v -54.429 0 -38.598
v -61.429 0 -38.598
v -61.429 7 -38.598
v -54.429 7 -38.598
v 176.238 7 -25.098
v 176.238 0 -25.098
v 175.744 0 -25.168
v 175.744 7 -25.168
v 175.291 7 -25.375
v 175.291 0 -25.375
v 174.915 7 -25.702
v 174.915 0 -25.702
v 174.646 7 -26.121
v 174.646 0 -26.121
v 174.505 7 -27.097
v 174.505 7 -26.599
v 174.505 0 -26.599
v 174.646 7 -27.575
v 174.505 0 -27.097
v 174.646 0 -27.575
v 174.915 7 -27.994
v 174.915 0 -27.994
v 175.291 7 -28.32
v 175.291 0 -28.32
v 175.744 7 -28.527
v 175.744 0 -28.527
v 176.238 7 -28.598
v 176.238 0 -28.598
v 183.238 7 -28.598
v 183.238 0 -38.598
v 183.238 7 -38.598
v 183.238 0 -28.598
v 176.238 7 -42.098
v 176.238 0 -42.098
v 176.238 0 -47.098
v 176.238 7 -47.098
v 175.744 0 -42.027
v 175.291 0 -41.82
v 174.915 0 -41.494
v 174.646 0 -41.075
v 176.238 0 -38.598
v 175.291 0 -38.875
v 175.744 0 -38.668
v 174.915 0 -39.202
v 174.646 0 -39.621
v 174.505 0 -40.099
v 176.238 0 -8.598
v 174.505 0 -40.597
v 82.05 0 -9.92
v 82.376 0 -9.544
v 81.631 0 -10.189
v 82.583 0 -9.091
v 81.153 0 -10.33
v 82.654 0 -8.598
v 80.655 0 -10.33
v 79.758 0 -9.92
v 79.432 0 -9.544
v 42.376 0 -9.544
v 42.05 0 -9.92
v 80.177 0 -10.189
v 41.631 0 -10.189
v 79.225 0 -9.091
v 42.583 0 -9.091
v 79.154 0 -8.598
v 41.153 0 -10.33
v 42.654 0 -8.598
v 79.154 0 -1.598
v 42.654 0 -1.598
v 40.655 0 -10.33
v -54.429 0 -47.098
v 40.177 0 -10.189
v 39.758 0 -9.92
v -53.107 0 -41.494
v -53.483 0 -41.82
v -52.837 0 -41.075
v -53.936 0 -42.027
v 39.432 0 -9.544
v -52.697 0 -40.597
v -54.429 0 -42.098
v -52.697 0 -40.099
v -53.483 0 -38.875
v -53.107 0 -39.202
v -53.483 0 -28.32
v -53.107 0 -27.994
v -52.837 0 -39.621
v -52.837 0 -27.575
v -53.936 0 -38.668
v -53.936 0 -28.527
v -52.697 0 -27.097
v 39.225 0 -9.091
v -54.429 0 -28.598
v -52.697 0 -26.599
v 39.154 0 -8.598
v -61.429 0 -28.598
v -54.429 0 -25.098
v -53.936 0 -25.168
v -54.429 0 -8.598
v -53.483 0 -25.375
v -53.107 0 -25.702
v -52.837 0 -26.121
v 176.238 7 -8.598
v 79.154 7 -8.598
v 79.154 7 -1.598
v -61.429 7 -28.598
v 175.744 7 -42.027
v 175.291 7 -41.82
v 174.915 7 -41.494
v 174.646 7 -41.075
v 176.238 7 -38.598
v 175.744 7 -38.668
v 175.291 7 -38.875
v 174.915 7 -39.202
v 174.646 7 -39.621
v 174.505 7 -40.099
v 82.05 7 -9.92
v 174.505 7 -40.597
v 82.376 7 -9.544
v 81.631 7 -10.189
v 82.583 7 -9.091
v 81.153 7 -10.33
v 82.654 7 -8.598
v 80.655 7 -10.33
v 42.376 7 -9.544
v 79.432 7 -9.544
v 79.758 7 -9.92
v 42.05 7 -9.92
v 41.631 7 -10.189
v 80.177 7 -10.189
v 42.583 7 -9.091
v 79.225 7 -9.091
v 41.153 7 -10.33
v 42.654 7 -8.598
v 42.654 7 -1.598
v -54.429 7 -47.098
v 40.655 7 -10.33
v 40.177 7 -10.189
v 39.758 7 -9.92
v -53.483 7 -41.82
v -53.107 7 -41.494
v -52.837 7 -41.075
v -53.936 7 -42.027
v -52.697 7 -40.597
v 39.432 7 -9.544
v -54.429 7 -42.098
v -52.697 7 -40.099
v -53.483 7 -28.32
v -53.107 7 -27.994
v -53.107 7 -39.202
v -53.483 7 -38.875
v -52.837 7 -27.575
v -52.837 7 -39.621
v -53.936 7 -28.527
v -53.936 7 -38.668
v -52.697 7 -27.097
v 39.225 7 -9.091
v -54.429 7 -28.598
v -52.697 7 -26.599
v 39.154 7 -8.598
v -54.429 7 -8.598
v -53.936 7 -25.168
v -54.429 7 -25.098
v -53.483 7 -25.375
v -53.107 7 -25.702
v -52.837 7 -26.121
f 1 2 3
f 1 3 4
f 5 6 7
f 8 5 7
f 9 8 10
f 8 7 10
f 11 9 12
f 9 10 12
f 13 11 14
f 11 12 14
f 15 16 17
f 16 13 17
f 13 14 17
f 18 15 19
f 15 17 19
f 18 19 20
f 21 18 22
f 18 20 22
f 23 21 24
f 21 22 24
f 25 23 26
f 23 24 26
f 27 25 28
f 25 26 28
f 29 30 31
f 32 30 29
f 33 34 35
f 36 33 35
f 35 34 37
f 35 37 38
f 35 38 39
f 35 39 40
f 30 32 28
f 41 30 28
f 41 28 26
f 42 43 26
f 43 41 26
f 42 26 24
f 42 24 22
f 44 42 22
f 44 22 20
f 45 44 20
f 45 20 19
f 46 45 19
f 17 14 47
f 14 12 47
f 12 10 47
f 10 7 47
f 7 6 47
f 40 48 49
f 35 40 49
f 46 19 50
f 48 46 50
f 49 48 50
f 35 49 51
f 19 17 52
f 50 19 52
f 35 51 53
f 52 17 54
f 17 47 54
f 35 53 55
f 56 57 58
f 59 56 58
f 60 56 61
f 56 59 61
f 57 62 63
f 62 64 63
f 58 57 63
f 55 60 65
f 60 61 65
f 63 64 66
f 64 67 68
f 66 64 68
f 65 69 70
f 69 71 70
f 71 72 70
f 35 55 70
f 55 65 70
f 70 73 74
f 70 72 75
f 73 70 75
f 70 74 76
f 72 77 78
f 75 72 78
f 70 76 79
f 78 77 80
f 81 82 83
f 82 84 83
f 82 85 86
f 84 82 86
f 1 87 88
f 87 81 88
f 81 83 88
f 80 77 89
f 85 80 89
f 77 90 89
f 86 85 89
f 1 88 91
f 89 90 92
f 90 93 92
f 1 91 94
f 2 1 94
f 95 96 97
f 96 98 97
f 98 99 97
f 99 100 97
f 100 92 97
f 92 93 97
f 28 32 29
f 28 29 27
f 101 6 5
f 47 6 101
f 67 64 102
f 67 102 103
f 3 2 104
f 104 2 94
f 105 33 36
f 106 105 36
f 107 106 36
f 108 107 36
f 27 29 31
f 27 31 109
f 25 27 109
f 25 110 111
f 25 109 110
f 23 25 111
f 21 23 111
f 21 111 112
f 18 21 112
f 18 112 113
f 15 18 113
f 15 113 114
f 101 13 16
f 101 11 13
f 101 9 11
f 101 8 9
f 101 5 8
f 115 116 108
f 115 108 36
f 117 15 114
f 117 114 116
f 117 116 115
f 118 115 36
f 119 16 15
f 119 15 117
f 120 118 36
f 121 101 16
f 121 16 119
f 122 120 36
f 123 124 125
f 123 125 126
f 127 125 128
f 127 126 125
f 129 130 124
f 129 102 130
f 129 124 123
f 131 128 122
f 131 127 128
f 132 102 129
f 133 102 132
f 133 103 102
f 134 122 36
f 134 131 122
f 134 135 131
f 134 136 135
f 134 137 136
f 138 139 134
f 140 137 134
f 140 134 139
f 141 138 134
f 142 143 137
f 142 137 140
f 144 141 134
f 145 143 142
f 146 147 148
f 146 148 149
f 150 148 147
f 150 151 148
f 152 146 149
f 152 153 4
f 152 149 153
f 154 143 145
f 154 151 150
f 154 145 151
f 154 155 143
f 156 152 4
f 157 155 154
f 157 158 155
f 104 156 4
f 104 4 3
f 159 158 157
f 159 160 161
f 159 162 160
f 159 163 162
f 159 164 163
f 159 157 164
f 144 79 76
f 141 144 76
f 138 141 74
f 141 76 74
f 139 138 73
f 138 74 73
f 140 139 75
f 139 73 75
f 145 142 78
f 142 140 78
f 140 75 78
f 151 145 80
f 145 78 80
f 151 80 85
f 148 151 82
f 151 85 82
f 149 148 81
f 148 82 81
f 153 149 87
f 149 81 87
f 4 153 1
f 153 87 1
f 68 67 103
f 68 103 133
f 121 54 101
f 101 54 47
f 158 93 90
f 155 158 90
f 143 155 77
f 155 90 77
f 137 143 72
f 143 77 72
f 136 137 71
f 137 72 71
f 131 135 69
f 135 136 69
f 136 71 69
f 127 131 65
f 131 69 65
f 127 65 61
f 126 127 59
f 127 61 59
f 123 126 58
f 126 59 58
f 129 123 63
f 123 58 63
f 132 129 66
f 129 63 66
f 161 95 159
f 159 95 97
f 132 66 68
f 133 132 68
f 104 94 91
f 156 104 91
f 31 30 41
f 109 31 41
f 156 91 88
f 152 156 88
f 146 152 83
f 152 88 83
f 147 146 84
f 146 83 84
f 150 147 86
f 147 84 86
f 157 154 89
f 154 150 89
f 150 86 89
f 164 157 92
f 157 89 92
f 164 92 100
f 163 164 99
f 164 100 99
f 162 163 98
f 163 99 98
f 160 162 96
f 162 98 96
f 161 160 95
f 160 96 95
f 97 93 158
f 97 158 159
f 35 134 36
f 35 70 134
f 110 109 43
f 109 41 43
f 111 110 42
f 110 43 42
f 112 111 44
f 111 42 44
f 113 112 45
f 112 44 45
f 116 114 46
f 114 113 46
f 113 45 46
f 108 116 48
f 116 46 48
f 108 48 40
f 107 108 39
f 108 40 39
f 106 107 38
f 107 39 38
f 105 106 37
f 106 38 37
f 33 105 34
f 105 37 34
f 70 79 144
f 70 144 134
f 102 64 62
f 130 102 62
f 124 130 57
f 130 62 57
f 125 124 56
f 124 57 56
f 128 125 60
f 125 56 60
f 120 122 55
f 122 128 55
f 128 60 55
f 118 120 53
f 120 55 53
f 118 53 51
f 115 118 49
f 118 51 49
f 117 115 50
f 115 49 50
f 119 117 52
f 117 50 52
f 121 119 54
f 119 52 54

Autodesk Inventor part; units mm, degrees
ref_plane "YZ Plane" through (0, 0, 0) normal (1, 0, 0) x (0, 1, 0)
ref_plane "XZ Plane" through (0, 0, 0) normal (0, 1, 0) x (-1, 0, 0)
ref_plane "XY Plane" through (0, 0, 0) normal (0, 0, 1) x (1, 0, 0)
sketch "Sketch1" plane through (0, 0, 0) normal (0, 1, 0) x (-1, 0, 0)
  arc A0 (54.4292, -38.5976) -> (54.4292, -42.0976) centre (54.4292, -40.3476) ccw
  arc A1 (54.4292, -25.0976) -> (54.4292, -28.5976) centre (54.4292, -26.8476) ccw
  line L0 (61.4292, -38.5976) -> (61.4292, -28.5976)
  line L1 (-79.1541, -1.5976) -> (-42.6541, -1.5976)
  line L2 (-79.1541, -8.5976) -> (-79.1541, -1.5976)
  line L3 (-42.6541, -8.5976) -> (-42.6541, -1.5976)
  line L4 (61.4292, -28.5976) -> (54.4292, -28.5976)
  line L5 (61.4292, -38.5976) -> (54.4292, -38.5976)
  line L6 (54.4292, -25.0976) -> (54.4292, -8.5976)
  line L7 (54.4292, -42.0976) -> (54.4292, -47.0976)
  line L8 (-60.9041, -44.0976) -> (-60.9041, -33.5976)
  arc A2 (-176.2375, -42.0976) -> (-176.2375, -38.5976) centre (-176.2375, -40.3476) ccw
  arc A3 (-176.2375, -28.5976) -> (-176.2375, -25.0976) centre (-176.2375, -26.8476) ccw
  line L9 (-183.2375, -38.5976) -> (-183.2375, -28.5976)
  line L10 (-183.2375, -28.5976) -> (-176.2375, -28.5976)
  line L11 (-183.2375, -38.5976) -> (-176.2375, -38.5976)
  line L12 (-176.2375, -25.0976) -> (-176.2375, -8.5976)
  line L13 (-176.2375, -42.0976) -> (-176.2375, -47.0976)
  line L14 (54.4292, -47.0976) -> (-176.2375, -47.0976)
  arc A4 (-82.6541, -8.5976) -> (-79.1541, -8.5976) centre (-80.9041, -8.5976) ccw
  line L15 (-82.6541, -8.5976) -> (-176.2375, -8.5976)
  arc A5 (-42.6541, -8.5976) -> (-39.1541, -8.5976) centre (-40.9041, -8.5976) ccw
  line L16 (-39.1541, -8.5976) -> (54.4292, -8.5976)
  point P0 (0, 0)
  dimension "d2" = 3.5
  dimension "d5" = 3.5
  dimension "d9" = 7
  dimension "d11" = 10
  dimension "d27" = 36.5
  dimension "d32" = 5
  dimension "d33" = 230.6667
  dimension "d36" = 7
  dimension "d41" = 3.5
  dimension "d42" = 3.5
  dimension "d43" = 97.0833
extrude "Extrusion1" add sketch "Sketch1" along normal blind 7
properties part number "Level 1 Support Ends" material "Wood (Maple)"
